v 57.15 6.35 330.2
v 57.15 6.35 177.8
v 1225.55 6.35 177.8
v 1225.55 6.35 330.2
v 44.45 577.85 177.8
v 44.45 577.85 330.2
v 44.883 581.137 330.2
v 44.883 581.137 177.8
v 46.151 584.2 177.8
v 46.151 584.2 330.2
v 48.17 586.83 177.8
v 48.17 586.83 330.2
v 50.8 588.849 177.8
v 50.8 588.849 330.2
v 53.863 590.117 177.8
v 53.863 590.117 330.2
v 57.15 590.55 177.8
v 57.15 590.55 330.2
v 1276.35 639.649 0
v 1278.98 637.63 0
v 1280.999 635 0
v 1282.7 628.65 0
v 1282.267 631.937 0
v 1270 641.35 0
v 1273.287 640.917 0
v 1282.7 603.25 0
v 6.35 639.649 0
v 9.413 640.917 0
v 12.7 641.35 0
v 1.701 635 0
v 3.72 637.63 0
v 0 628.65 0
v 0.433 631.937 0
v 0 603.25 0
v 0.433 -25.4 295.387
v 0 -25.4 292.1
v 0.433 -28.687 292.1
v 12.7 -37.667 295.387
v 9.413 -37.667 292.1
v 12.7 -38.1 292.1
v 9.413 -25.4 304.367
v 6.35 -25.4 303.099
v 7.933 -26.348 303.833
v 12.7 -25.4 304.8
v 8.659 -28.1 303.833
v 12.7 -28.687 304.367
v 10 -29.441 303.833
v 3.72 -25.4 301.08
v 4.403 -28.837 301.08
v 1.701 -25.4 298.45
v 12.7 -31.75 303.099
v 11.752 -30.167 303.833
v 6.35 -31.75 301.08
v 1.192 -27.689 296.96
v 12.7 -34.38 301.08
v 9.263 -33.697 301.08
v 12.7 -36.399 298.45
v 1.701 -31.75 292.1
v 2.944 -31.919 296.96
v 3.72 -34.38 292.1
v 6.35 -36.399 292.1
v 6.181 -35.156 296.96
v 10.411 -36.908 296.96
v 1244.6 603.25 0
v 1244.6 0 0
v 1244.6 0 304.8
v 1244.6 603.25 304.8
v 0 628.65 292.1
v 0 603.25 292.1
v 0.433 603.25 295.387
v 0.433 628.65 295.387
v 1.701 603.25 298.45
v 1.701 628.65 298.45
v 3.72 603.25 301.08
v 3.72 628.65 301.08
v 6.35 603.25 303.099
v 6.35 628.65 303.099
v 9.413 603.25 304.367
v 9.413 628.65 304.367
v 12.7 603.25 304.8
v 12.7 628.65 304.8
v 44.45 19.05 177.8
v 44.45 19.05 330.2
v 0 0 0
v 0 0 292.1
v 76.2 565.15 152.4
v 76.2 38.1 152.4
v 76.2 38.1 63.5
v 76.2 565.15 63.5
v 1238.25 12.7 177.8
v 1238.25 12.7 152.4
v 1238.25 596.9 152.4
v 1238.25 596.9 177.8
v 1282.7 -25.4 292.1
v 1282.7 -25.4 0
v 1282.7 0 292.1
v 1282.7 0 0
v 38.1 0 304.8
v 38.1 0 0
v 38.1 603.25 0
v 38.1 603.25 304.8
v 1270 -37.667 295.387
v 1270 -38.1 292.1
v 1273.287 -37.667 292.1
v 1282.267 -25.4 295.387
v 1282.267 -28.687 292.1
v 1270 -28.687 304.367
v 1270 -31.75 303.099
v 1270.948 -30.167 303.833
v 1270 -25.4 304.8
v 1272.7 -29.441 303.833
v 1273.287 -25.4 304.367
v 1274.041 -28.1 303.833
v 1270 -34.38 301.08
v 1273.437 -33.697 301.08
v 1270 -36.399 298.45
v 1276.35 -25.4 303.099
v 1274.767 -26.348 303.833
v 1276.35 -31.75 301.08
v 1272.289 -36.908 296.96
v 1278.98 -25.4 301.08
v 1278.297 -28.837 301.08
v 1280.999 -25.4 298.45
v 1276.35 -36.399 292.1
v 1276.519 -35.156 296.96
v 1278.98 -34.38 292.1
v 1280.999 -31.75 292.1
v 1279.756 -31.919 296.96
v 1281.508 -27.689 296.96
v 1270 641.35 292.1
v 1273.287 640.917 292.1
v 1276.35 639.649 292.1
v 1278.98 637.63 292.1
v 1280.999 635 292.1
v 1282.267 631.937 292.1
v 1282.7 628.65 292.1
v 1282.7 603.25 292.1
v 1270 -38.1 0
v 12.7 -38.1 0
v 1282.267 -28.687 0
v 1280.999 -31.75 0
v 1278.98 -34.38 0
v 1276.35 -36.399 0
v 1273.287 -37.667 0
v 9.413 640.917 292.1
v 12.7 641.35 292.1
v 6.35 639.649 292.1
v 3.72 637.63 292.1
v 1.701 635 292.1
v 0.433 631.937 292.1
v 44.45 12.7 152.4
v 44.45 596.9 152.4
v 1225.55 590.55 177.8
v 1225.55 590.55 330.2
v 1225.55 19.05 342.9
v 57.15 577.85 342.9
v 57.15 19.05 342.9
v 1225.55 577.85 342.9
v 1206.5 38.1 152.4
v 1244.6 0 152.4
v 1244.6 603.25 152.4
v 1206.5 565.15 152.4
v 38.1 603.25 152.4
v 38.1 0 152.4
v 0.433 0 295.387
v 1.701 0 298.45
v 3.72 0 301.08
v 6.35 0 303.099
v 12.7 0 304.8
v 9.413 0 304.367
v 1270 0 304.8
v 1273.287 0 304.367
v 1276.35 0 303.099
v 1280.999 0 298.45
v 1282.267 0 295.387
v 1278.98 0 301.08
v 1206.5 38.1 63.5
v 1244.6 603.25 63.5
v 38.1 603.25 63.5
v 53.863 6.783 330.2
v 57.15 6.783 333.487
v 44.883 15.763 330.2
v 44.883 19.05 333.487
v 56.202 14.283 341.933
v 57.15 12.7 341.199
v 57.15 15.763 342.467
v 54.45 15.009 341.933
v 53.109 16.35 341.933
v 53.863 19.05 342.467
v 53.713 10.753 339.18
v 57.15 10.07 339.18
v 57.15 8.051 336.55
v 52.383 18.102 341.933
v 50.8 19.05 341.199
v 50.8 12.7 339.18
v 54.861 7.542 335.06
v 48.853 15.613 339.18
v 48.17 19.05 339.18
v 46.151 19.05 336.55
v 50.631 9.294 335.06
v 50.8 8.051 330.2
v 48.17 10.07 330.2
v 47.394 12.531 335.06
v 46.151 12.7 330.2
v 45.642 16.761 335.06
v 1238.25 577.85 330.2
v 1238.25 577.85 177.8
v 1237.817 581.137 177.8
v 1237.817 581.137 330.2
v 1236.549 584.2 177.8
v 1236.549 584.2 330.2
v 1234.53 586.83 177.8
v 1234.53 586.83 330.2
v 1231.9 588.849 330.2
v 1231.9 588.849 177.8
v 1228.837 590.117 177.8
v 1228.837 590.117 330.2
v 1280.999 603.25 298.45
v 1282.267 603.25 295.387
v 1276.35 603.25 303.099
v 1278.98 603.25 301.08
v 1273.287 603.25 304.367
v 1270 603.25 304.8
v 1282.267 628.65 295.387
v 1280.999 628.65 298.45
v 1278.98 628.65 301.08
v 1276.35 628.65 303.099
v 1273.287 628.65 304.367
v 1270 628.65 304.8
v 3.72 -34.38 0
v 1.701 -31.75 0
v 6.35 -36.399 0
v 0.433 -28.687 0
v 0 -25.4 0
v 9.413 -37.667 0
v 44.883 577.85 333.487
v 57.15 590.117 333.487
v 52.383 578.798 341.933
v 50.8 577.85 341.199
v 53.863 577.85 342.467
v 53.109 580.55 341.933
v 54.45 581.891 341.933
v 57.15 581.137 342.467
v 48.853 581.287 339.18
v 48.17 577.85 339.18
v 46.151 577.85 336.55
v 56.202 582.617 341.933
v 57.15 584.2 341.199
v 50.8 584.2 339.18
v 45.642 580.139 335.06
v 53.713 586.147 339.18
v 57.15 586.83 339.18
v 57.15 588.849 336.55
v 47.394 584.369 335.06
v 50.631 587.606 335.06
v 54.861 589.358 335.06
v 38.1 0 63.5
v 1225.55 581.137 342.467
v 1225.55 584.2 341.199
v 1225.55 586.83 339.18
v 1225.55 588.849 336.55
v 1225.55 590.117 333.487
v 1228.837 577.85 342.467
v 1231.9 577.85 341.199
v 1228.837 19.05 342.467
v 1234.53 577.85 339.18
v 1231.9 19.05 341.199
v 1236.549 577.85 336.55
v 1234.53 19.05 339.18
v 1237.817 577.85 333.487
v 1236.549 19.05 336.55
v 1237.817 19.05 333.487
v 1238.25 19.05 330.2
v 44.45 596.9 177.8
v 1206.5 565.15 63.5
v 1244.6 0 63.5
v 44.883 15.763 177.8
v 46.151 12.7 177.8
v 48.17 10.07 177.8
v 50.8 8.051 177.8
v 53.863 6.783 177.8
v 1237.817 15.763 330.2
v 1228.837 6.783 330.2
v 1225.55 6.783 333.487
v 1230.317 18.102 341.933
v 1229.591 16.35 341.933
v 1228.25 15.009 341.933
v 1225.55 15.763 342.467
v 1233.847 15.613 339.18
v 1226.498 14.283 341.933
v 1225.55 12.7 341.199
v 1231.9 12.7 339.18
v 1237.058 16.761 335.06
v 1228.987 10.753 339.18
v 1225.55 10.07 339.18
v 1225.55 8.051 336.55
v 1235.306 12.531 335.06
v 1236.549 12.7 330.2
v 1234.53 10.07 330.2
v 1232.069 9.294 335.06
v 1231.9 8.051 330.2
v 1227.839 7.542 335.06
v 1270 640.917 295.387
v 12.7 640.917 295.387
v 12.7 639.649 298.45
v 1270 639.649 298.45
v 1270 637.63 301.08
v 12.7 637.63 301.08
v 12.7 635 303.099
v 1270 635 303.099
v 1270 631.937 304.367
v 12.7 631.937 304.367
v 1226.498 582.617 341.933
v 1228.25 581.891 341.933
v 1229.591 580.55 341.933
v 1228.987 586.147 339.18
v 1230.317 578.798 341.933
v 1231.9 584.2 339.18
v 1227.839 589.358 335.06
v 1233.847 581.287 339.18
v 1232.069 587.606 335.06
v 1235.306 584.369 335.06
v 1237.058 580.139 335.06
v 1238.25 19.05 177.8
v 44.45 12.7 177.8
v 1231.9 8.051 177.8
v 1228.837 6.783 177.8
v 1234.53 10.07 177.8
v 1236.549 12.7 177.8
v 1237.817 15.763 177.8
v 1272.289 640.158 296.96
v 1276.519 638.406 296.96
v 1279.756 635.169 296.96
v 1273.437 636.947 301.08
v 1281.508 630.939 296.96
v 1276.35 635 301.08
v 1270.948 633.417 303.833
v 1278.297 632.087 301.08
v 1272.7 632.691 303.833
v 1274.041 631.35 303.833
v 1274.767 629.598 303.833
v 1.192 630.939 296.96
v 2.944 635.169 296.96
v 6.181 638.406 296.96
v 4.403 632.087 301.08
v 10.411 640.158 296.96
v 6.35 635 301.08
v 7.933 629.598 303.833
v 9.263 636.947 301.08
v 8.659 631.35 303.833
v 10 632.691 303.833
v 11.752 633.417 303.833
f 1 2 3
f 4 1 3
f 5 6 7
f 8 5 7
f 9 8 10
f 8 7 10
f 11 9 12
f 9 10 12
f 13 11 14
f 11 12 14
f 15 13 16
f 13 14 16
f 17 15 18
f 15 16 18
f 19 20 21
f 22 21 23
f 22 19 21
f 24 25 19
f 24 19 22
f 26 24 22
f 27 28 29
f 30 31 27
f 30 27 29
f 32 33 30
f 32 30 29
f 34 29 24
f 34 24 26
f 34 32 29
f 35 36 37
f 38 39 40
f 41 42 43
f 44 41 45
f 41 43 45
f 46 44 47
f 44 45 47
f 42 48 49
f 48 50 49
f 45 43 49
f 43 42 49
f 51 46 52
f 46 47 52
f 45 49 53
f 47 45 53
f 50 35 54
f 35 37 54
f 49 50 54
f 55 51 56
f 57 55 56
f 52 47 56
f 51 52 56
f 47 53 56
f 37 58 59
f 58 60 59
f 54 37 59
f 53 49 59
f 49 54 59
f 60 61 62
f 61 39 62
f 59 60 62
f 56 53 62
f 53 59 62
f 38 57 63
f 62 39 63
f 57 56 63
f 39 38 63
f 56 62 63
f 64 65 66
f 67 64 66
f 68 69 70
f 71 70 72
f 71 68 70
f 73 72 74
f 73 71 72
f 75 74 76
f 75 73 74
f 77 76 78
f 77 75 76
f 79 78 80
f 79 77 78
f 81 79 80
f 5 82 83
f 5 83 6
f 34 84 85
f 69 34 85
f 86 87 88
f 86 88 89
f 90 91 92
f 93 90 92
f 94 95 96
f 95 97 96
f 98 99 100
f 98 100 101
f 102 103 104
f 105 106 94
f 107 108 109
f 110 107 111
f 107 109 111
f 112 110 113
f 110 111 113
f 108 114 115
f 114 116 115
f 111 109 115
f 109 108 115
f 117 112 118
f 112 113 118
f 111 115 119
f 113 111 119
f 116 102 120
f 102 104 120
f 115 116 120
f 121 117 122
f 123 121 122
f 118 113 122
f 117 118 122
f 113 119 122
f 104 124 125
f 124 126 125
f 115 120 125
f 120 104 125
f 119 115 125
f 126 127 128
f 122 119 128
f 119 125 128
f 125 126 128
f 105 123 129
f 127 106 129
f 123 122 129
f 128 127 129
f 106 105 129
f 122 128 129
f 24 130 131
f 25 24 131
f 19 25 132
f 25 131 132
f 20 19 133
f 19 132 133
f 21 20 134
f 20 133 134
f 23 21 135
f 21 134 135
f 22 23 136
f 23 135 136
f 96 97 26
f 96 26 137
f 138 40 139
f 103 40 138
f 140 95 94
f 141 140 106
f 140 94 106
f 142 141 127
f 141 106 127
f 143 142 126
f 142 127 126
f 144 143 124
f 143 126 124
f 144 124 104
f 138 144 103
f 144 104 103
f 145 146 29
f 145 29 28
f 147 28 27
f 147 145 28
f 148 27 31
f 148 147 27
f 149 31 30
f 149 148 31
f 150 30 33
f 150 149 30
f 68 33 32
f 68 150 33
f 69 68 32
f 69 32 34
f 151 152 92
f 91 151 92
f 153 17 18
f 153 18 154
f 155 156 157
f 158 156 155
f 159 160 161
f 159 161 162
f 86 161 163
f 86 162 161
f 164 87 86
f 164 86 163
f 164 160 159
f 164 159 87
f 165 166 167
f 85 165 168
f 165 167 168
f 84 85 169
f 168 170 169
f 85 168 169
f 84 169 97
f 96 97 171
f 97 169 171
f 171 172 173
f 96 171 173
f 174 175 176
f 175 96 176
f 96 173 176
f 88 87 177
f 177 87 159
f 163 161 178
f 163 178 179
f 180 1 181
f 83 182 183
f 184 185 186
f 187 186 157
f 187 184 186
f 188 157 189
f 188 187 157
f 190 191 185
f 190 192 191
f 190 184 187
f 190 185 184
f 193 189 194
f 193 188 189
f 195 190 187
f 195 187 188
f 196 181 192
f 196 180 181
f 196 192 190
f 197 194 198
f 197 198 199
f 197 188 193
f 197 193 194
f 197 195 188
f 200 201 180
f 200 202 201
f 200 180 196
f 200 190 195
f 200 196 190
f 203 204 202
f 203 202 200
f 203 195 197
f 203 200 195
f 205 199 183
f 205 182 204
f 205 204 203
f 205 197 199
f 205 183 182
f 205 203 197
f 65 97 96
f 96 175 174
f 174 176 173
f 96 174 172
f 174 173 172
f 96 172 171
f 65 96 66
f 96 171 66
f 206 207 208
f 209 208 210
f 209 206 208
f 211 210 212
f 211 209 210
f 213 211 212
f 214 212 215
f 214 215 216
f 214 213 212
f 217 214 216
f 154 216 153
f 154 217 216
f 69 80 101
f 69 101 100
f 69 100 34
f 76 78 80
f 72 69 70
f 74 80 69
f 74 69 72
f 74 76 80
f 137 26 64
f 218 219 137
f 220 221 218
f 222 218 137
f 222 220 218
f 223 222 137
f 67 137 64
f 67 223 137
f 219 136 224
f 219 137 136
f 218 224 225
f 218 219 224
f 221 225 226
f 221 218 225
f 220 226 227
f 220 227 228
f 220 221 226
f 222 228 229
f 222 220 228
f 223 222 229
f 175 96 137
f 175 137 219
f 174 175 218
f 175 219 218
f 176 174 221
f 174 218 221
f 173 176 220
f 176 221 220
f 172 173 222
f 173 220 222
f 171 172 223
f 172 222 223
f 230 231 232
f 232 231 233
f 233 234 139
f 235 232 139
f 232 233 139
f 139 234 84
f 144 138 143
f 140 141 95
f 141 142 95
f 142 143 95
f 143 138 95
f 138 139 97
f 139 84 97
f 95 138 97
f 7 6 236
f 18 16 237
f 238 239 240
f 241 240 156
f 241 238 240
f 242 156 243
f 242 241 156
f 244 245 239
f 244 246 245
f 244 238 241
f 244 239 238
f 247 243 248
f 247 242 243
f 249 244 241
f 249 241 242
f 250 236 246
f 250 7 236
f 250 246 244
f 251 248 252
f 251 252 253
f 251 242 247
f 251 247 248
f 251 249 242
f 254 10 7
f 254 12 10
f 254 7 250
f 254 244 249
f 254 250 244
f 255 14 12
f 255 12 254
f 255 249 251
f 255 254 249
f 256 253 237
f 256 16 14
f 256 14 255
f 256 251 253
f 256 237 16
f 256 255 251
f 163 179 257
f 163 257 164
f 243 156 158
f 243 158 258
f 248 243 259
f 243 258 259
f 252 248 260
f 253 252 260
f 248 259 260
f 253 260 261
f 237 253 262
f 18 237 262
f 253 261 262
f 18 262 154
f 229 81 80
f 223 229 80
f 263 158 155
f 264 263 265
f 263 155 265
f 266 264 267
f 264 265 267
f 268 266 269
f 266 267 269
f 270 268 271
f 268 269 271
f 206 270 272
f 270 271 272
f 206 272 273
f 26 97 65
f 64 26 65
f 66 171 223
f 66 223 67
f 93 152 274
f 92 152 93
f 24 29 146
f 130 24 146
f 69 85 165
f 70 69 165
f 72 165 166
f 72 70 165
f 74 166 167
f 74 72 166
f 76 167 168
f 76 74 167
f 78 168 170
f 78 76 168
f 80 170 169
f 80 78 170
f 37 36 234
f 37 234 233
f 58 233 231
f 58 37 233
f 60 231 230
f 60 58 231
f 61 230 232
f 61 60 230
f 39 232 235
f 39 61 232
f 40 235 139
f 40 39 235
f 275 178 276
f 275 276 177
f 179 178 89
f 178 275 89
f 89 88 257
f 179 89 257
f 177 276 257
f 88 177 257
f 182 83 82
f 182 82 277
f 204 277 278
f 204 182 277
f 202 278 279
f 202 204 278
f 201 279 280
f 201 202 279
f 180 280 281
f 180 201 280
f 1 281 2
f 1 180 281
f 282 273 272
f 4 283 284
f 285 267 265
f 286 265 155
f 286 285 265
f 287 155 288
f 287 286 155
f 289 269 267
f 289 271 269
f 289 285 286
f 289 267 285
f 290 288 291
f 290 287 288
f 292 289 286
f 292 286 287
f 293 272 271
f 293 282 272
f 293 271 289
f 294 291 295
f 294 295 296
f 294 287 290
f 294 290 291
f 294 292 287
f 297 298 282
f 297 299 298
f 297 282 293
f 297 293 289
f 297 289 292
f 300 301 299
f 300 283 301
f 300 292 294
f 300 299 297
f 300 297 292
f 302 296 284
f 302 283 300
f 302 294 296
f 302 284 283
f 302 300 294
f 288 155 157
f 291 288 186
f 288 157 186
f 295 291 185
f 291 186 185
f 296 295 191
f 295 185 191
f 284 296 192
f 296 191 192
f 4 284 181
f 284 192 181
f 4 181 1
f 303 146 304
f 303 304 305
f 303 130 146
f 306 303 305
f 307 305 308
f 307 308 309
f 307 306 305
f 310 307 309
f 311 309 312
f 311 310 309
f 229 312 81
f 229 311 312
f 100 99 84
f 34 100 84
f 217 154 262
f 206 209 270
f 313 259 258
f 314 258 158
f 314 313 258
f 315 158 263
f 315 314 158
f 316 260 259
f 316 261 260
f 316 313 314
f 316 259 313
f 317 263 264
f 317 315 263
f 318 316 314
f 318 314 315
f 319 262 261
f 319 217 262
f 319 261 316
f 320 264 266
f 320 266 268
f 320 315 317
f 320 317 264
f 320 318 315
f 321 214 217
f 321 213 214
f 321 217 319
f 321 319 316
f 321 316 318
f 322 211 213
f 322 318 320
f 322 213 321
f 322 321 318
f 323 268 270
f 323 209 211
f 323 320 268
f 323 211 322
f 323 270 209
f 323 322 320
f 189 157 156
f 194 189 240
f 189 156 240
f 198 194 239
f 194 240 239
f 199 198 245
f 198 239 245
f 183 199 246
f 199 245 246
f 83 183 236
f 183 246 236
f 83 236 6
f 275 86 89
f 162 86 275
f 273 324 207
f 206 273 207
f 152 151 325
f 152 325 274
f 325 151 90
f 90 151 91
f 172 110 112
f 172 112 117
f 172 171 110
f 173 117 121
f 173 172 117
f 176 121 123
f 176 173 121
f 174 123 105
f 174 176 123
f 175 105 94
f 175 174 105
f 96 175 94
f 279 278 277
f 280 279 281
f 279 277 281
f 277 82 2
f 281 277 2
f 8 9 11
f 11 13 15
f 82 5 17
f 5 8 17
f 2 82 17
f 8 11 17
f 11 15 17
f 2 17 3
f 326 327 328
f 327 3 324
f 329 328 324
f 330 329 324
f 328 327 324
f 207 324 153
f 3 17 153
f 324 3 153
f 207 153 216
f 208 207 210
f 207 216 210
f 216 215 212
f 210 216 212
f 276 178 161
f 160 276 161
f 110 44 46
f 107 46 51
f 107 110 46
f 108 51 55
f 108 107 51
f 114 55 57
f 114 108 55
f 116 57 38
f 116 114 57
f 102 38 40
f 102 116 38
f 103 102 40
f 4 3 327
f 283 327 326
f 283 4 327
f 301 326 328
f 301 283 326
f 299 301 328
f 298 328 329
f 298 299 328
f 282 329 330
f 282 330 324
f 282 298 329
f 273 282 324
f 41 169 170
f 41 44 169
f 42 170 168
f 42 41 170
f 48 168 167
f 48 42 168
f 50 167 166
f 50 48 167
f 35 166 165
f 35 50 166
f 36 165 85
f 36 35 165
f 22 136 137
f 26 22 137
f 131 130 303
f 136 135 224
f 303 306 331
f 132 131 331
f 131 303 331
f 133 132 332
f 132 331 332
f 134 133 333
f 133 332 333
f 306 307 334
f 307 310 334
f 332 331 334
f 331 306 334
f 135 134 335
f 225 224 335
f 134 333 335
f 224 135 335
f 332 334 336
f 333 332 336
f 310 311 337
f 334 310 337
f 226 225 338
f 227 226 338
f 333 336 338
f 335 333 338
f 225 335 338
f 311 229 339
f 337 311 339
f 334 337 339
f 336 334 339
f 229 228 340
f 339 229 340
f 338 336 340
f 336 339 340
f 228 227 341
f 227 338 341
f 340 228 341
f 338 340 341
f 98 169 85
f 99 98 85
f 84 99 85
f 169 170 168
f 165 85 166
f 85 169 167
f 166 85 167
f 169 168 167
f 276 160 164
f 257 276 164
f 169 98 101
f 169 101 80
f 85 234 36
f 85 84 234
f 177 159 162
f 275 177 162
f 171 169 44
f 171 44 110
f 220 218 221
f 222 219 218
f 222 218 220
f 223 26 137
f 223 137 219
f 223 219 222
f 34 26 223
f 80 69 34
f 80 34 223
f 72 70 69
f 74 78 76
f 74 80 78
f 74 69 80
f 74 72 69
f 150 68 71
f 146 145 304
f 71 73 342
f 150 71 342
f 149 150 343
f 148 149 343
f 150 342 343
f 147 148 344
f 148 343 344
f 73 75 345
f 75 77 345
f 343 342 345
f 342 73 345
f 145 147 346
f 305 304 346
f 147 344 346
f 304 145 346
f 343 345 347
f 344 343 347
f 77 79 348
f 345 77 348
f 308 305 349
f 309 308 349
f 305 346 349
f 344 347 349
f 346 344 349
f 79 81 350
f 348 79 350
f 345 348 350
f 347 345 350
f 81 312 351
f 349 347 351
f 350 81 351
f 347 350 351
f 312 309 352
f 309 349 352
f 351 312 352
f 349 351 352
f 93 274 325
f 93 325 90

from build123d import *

# Parameters (mm, degrees)
F0_W      = 1282.7
F0_H      = 304.8
F1_DEPTH  = 38.1
F2_W      = 38.1
F2_H      = 304.8
F3_DEPTH  = 603.25
F4_W      = 38.1
F4_H      = 304.8
F5_DEPTH  = 1282.7
F6_W      = 1206.5
F6_H      = 88.9
F7_DEPTH  = 603.25
F8_W      = 1130.3
F8_H      = 527.05
F9_DEPTH  = 152.401
F10_W     = 1193.8
F10_H     = 584.2
F11_DEPTH = 25.4
F12_W     = 1193.8
F12_H     = 584.2
F13_DEPTH = 165.1
F14_R     = 12.7
F14_2_R   = 12.7
F15_R     = 12.7
F15_2_R   = 12.7
F15_3_R   = 12.7
F15_4_R   = 12.7
F16_R     = 12.7
F17_R     = 12.7


with BuildPart() as f1:
    # F0 (on Front) → F1 (new body)
    with BuildSketch(Plane.XZ):
        with Locations((641.35, 152.4)):
            Rectangle(F0_W, F0_H)
    extrude(amount=F1_DEPTH)

    # F14#2
    f14_2_edges = [f1.edges().sort_by_distance(p)[0] for p in [
        (0, -38.1, 152.4),
        (1282.7, -38.1, 152.4),
    ]]
    fillet(f14_2_edges, radius=F14_2_R)

    # F15#4
    f15_4_edges = [f1.edges().sort_by_distance(p)[0] for p in [
        (641.35, -38.1, 304.8),
    ]]
    fillet(f15_4_edges, radius=F15_4_R)


with BuildPart() as f3:
    # F2 (on face) → F3 (new body)
    with BuildSketch(Plane(origin=(0, 0, 0), x_dir=(-1, 0, 0), z_dir=(0, 1, 0))):
        with Locations((-1263.65, 152.4)):
            Rectangle(F2_W, F2_H)
    extrude(amount=F3_DEPTH)

    # F15#3
    f15_3_edges = [f3.edges().sort_by_distance(p)[0] for p in [
        (1282.7, 301.625, 304.8),
    ]]
    fillet(f15_3_edges, radius=F15_3_R)


with BuildPart() as f3b:
    # F2 (on face) → F3, piece 2 (new body)
    with BuildSketch(Plane(origin=(0, 0, 0), x_dir=(-1, 0, 0), z_dir=(0, 1, 0))):
        with Locations((-19.05, 152.4)):
            Rectangle(F2_W, F2_H)
    extrude(amount=F3_DEPTH)

    # F15#2
    f15_2_edges = [f3b.edges().sort_by_distance(p)[0] for p in [
        (0, 301.625, 304.8),
    ]]
    fillet(f15_2_edges, radius=F15_2_R)


with BuildPart() as f5:
    # F4 (on face) → F5 (new body, through all)
    with BuildSketch(Plane(origin=(0, 0, 0), x_dir=(0, -1, 0), z_dir=(-1, 0, 0))):
        with Locations((-622.3, 152.4)):
            Rectangle(F4_W, F4_H)
    extrude(amount=-F5_DEPTH)

    # F14
    f14_edges = [f5.edges().sort_by_distance(p)[0] for p in [
        (0, 641.35, 152.4),
        (1282.7, 641.35, 152.4),
    ]]
    fillet(f14_edges, radius=F14_R)

    # F15
    f15_edges = [f5.edges().sort_by_distance(p)[0] for p in [
        (641.35, 641.35, 304.8),
    ]]
    fillet(f15_edges, radius=F15_R)


with BuildPart() as f7:
    # F6 (on face) → F7 (new body, through all)
    with BuildSketch(Plane(origin=(0, 0, 0), x_dir=(-1, 0, 0), z_dir=(0, 1, 0))):
        with Locations((-641.35, 107.95)):
            Rectangle(F6_W, F6_H)
    extrude(amount=F7_DEPTH)

    # F8 (on face) → F9 (cut, through all)
    with BuildSketch(Plane.XY.offset(152.4)):
        with Locations((641.35, 301.625)):
            Rectangle(F8_W, F8_H)
    extrude(amount=-F9_DEPTH, mode=Mode.SUBTRACT)


with BuildPart() as f11:
    # F10 (on face) → F11 (new body)
    with BuildSketch(Plane.XY.offset(152.4)):
        with Locations((641.35, 304.8)):
            Rectangle(F10_W, F10_H)
    extrude(amount=F11_DEPTH)


with BuildPart() as f13:
    # F12 (on face) → F13 (new body)
    with BuildSketch(Plane.XY.offset(177.8)):
        with Locations((641.35, 298.45)):
            Rectangle(F12_W, F12_H)
    extrude(amount=F13_DEPTH)

    # F16
    f16_edges = [f13.edges().sort_by_distance(p)[0] for p in [
        (44.45, 590.55, 260.35),
        (1238.25, 590.55, 260.35),
        (1238.25, 6.35, 260.35),
        (44.45, 6.35, 260.35),
    ]]
    fillet(f16_edges, radius=F16_R)

    # F17
    f17_edges = [f13.edges().sort_by_distance(p)[0] for p in [
        (641.35, 590.55, 342.9),
    ]]
    fillet(f17_edges, radius=F17_R)


solid = Compound([f1.part, f3.part, f3b.part, f5.part, f7.part, f11.part, f13.part])
